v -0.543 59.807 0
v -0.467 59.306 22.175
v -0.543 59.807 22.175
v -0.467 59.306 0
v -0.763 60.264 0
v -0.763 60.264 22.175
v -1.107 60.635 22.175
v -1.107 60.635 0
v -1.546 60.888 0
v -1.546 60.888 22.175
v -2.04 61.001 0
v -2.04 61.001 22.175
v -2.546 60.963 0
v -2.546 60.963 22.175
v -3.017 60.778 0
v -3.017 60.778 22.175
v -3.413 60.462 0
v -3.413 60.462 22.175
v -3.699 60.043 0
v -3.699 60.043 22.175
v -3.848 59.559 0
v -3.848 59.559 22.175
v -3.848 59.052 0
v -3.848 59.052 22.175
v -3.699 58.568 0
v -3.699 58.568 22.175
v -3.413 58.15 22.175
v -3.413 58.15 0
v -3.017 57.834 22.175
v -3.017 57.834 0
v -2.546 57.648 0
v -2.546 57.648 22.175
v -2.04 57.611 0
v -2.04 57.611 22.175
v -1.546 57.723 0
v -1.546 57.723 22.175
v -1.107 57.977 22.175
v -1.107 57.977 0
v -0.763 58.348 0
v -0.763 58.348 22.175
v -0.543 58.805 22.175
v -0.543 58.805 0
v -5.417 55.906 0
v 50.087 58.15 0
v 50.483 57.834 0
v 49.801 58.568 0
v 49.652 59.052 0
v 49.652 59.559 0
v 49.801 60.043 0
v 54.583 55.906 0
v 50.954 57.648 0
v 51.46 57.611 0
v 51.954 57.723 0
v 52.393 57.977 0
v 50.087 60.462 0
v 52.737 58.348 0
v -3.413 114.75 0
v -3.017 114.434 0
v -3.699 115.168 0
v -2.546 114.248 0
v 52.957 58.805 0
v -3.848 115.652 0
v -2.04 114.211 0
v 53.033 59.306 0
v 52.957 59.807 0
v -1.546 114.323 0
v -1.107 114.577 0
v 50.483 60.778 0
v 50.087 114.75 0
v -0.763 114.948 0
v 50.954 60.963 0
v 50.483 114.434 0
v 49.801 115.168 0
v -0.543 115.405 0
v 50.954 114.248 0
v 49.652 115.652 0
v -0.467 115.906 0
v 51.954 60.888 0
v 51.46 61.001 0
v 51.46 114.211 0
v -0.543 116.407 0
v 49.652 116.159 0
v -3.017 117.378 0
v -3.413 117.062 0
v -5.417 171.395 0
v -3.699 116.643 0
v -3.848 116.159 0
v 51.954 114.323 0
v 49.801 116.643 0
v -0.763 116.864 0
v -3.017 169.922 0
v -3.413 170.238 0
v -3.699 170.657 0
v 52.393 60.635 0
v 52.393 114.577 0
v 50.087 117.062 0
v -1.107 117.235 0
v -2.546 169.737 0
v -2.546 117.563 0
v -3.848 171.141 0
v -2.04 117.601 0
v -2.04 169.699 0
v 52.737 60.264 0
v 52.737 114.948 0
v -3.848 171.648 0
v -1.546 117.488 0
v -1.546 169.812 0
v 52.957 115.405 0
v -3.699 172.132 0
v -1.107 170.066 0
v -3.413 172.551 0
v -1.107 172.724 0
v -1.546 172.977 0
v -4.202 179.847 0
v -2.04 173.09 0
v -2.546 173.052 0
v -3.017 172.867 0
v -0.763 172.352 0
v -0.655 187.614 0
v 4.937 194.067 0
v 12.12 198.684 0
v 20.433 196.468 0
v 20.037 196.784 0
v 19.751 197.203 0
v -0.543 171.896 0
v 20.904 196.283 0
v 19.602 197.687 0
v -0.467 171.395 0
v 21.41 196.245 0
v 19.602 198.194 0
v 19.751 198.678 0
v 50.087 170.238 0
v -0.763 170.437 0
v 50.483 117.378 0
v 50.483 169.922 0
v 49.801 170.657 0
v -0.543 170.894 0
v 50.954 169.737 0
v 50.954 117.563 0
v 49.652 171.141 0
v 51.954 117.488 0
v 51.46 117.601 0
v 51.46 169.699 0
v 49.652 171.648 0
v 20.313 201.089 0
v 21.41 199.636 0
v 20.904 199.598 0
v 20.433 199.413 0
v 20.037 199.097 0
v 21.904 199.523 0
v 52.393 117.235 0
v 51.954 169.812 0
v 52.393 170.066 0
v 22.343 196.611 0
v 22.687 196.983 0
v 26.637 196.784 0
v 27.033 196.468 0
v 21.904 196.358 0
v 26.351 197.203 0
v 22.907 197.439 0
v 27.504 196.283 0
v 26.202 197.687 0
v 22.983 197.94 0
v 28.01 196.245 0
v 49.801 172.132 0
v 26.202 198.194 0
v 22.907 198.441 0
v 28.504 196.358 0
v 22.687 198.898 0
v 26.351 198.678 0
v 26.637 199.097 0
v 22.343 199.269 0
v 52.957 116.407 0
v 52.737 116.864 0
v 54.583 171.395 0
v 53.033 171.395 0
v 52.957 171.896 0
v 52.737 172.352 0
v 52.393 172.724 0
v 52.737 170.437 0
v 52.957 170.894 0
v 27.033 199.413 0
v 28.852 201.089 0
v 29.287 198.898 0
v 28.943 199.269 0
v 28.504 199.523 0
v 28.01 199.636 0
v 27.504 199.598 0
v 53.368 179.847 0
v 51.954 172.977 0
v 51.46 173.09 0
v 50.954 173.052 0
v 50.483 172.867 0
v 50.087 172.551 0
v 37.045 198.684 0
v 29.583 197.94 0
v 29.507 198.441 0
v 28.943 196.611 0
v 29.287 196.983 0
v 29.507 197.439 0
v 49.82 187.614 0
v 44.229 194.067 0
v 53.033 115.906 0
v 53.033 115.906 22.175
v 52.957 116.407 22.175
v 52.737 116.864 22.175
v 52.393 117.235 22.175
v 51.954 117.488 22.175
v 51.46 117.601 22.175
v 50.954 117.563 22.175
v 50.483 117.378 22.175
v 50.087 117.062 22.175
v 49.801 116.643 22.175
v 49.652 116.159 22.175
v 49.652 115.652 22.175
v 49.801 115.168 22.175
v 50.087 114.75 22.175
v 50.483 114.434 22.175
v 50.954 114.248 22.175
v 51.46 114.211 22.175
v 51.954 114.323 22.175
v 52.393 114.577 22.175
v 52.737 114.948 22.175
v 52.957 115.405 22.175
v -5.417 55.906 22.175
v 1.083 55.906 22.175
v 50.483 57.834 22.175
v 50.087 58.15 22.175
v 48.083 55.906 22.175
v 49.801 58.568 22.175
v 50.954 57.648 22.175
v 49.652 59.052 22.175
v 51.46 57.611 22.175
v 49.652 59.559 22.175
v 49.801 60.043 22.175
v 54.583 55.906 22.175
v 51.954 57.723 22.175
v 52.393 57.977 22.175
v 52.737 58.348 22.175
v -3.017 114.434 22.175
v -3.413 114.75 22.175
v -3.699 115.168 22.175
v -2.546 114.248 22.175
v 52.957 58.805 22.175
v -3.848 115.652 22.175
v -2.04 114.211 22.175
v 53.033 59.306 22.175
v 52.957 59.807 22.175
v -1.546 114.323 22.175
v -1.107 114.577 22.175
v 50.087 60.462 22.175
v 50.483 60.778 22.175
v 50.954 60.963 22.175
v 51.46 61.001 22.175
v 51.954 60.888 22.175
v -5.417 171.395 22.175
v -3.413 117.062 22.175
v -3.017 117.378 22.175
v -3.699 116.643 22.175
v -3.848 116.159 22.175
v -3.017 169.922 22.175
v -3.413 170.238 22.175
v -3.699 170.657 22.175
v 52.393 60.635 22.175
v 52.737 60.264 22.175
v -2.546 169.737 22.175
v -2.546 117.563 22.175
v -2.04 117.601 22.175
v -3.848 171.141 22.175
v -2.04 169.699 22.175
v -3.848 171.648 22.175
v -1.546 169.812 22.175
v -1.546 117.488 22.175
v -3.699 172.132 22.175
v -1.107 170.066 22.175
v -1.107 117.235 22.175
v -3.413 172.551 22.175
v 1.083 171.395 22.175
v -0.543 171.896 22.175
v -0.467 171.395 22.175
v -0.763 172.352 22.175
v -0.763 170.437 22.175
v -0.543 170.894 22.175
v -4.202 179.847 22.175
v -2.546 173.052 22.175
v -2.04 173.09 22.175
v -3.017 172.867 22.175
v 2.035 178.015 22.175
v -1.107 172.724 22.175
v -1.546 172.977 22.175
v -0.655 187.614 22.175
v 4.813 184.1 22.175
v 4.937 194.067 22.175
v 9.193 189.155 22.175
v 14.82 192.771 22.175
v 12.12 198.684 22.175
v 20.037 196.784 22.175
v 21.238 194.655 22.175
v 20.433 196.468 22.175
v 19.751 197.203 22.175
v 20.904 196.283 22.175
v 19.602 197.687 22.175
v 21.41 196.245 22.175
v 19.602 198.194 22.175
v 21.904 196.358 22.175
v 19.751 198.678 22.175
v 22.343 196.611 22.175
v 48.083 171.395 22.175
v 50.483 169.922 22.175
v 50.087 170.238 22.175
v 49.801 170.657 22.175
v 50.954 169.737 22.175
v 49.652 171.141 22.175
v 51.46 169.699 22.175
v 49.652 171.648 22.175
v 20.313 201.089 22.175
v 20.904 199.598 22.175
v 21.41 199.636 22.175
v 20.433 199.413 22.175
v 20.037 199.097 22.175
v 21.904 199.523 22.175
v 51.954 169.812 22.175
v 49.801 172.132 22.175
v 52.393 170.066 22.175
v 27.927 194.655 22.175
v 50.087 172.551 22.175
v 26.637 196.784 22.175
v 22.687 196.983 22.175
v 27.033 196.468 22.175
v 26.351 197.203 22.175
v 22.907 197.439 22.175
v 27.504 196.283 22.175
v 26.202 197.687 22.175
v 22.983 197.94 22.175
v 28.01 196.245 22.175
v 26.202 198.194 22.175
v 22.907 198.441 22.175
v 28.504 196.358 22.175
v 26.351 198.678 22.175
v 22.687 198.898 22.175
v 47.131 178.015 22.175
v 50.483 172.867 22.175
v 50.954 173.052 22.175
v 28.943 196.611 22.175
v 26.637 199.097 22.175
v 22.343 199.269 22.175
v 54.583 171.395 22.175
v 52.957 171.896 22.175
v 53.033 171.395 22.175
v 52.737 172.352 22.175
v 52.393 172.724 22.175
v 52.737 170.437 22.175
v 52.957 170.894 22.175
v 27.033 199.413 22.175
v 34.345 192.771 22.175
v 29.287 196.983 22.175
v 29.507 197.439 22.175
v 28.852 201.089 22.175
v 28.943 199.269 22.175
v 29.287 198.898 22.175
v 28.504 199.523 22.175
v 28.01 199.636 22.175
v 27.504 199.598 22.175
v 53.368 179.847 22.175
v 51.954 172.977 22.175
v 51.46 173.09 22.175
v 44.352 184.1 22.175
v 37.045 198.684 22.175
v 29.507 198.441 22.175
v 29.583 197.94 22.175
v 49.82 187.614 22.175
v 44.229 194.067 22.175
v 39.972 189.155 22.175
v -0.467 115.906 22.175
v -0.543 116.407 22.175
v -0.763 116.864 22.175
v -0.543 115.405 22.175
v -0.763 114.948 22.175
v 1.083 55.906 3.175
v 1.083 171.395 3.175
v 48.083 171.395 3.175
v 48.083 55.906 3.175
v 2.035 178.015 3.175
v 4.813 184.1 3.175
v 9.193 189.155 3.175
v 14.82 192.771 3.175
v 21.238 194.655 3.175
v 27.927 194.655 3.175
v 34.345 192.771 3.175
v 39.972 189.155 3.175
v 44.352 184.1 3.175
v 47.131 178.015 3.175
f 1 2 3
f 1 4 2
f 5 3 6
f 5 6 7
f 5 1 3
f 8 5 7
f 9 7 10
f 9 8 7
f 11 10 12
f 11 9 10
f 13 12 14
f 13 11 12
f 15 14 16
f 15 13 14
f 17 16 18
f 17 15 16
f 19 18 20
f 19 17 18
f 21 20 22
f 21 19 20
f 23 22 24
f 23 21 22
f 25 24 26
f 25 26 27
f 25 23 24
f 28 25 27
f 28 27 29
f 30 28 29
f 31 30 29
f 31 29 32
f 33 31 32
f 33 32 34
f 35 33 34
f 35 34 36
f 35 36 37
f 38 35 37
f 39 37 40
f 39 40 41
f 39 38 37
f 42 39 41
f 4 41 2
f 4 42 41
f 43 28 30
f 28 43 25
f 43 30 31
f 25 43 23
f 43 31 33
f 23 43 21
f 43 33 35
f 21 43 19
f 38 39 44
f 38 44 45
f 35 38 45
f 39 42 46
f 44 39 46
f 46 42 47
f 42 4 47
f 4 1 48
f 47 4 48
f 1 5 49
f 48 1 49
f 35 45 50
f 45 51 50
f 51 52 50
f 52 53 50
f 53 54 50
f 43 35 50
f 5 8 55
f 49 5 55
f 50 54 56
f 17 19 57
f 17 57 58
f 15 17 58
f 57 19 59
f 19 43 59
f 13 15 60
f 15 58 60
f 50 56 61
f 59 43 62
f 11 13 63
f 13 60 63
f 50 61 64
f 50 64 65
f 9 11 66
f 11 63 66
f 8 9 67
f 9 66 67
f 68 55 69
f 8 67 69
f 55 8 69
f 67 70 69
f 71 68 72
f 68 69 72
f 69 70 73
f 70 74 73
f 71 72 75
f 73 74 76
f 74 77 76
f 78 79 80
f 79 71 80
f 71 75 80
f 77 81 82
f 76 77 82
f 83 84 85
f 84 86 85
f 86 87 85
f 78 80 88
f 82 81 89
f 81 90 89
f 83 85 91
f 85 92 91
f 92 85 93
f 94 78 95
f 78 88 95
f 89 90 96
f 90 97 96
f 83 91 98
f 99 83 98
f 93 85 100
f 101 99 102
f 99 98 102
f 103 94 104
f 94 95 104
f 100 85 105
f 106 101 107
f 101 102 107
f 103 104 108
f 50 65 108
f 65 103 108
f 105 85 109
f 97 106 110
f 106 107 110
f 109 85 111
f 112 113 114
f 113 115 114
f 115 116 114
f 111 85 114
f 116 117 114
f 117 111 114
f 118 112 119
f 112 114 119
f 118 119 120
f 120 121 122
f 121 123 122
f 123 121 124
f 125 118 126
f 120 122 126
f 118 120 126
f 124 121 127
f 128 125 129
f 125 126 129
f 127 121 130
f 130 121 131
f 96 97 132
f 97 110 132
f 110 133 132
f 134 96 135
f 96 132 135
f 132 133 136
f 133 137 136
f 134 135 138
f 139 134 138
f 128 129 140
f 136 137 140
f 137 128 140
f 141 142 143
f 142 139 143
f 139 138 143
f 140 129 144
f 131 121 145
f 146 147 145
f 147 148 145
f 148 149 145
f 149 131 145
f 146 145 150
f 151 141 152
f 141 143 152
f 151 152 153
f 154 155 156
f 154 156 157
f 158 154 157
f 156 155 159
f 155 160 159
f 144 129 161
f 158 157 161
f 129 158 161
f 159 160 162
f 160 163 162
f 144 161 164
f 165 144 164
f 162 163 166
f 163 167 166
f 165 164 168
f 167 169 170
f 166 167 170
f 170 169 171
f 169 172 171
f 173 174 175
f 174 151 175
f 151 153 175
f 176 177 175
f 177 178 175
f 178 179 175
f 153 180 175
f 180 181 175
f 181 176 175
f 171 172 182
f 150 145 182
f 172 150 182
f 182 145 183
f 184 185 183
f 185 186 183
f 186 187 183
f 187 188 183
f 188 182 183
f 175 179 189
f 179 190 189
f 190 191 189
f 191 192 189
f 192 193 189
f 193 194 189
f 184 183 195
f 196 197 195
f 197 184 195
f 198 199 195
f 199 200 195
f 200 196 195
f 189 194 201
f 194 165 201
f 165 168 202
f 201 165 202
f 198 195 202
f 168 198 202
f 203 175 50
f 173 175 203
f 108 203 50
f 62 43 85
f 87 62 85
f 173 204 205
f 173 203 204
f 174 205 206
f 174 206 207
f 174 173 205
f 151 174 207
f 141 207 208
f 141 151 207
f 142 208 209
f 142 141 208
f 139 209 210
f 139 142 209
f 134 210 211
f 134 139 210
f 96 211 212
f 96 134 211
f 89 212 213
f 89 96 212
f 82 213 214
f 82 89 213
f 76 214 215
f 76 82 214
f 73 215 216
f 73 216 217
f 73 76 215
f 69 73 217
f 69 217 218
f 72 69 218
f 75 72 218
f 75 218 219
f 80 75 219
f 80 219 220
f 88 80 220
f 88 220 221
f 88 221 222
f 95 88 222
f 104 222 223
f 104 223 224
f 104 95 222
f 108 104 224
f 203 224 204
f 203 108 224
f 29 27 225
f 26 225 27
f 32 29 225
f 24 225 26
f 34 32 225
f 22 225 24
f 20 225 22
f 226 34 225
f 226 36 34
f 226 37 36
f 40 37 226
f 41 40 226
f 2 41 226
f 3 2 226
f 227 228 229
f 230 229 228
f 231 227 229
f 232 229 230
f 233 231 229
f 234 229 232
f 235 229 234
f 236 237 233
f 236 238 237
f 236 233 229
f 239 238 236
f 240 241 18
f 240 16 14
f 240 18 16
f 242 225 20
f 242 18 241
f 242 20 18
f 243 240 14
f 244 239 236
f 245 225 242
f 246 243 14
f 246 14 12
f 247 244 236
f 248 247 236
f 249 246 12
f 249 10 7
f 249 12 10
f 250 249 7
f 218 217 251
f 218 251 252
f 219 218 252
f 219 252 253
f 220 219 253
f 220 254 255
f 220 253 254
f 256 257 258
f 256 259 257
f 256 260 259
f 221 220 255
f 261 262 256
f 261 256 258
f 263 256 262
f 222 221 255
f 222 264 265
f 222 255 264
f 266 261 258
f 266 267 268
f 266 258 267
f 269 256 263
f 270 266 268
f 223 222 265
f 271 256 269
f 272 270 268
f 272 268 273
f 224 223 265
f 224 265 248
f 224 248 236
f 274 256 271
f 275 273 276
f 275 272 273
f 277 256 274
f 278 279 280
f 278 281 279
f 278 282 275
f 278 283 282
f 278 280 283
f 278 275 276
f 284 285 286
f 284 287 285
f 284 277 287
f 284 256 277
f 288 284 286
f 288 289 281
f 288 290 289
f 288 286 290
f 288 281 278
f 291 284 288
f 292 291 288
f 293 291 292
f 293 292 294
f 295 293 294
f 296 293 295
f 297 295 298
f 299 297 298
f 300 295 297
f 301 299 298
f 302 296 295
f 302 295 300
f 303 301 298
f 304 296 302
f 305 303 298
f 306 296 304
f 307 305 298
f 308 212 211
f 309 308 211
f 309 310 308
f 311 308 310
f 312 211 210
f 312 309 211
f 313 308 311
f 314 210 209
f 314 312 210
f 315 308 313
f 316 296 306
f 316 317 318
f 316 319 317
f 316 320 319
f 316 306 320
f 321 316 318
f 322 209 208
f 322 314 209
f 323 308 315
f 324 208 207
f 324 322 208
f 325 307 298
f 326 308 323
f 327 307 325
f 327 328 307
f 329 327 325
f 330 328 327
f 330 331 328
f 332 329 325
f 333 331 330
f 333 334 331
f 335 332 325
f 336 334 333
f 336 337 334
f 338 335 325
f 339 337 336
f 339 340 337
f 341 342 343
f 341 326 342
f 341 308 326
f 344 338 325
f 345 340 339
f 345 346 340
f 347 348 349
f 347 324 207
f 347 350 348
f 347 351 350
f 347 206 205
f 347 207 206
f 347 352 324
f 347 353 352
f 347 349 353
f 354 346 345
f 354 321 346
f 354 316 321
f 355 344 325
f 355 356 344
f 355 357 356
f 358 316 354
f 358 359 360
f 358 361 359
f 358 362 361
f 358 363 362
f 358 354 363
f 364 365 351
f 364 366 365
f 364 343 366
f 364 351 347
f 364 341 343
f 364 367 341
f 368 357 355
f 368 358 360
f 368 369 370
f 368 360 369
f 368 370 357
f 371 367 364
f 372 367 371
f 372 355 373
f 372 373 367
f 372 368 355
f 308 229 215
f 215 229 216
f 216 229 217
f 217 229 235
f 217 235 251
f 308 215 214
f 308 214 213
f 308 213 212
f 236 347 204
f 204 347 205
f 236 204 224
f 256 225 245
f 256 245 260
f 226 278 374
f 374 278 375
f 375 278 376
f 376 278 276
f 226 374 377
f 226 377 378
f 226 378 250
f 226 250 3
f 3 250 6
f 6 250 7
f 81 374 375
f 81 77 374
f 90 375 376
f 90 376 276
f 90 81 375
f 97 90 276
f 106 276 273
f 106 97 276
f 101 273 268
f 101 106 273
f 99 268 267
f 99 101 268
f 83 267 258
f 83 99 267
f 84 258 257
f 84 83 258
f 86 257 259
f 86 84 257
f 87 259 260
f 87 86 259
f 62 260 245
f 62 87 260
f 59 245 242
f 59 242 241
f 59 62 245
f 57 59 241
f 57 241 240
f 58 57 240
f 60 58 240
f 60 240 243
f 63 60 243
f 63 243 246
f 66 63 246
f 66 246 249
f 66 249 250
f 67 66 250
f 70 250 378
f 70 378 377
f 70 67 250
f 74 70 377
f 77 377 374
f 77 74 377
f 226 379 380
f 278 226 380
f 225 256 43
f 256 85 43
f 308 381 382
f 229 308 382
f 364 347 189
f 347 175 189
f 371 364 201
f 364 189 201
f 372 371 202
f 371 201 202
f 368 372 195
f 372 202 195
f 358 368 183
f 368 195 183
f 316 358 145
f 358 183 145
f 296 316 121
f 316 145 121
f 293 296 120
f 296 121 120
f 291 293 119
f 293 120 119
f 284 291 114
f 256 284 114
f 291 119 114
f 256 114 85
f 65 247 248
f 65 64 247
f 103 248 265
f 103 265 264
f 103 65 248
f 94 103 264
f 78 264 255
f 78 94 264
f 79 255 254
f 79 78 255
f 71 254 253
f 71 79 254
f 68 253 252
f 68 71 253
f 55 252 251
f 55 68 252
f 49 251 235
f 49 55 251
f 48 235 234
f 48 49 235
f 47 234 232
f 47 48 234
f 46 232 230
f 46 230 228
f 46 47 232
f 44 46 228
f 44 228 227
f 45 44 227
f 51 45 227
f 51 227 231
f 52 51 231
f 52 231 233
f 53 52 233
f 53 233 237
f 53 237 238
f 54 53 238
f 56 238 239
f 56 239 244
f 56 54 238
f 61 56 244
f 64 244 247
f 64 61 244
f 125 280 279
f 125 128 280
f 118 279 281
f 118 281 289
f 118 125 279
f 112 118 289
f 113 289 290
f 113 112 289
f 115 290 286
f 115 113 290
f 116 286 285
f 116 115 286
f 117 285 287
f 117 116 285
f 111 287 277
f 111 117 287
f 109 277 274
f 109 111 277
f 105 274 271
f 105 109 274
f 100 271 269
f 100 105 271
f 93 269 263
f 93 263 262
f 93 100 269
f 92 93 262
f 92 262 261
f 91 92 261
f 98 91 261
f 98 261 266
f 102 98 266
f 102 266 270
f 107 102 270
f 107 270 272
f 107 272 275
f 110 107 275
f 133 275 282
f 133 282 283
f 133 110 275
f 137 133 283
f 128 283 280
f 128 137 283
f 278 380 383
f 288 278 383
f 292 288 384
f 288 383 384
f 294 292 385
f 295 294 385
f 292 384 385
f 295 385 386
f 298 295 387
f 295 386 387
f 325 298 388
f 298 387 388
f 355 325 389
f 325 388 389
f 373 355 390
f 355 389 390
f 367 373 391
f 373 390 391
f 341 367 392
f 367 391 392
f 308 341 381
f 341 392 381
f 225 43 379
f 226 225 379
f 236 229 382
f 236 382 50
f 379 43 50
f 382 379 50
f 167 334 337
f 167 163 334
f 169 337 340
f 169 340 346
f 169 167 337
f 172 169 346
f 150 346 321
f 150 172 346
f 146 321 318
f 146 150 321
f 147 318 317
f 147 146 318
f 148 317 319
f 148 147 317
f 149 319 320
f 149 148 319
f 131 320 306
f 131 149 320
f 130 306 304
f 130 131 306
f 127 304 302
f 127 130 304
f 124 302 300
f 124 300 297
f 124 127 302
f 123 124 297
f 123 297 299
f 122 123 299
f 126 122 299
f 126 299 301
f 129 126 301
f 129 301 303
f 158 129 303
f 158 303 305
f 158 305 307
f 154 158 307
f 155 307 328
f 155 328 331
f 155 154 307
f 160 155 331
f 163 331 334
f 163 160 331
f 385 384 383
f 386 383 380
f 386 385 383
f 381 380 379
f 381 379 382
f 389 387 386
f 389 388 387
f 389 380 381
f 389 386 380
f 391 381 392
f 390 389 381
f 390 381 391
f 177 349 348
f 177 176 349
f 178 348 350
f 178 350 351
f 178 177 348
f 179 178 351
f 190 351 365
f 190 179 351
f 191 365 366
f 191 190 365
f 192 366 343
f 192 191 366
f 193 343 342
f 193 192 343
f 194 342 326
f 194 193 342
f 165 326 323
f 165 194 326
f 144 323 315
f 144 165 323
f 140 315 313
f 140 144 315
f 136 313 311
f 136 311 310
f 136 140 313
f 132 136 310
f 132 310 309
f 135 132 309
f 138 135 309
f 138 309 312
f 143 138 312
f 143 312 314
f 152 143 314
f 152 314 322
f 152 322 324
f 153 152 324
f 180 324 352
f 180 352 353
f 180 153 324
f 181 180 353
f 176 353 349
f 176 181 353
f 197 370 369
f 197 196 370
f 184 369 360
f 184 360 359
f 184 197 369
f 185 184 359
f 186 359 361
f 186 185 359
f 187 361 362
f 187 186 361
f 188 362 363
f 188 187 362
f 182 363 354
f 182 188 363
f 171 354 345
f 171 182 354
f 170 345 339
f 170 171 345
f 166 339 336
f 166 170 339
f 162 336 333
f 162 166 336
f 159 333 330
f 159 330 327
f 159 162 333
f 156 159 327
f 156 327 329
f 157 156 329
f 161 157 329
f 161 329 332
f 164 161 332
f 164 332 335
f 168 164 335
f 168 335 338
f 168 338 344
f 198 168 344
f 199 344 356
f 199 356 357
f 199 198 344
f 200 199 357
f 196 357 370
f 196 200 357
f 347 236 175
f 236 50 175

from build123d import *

# Parameters (mm, degrees)
SKETCH2_R           = 1.7
BOSS_EXTRUDE1_DEPTH = 3.175
SKETCH3_W           = 60
SKETCH3_H           = 160.555920096
CUT_EXTRUDE1_DEPTH  = 4.175
SKETCH4_R           = 1.7
BOSS_EXTRUDE2_DEPTH = 19


with BuildPart() as part:
    # Sketch2 → Boss-Extrude1 (new body)
    with BuildSketch(Plane.XY):
        with BuildLine():
            Line((54.582717937, -59.58290593), (54.582717937, 171.394622999))
            ThreePointArc((54.582717937, 171.394622999), (24.582717937, 201.394622999), (-5.417282063, 171.394622999))
            Line((-5.417282063, 171.394622999), (-5.417282063, -59.58290593))
            ThreePointArc((-5.417282063, -59.58290593), (24.582717937, -89.58290593), (54.582717937, -59.58290593))
        make_face()
        with Locations((27.882717937, 197.940291196)):
            Circle(SKETCH2_R, mode=Mode.SUBTRACT)
        with Locations((-2.167282063, -59.58290593)):
            Circle(SKETCH2_R, mode=Mode.SUBTRACT)
        with Locations((5.667611541, -78.498012327)):
            Circle(SKETCH2_R, mode=Mode.SUBTRACT)
        with Locations((21.182717937, -86.115951364)):
            Circle(SKETCH2_R, mode=Mode.SUBTRACT)
        with Locations((51.332717937, 171.394622999)):
            Circle(SKETCH2_R, mode=Mode.SUBTRACT)
        with Locations((-2.167282063, 59.305858535)):
            Circle(SKETCH2_R, mode=Mode.SUBTRACT)
        with Locations((27.982717937, -86.115951364)):
            Circle(SKETCH2_R, mode=Mode.SUBTRACT)
        with Locations((-2.167282063, 171.394622999)):
            Circle(SKETCH2_R, mode=Mode.SUBTRACT)
        with Locations((51.332717937, 115.905858535)):
            Circle(SKETCH2_R, mode=Mode.SUBTRACT)
        with Locations((-2.167282063, 115.905858535)):
            Circle(SKETCH2_R, mode=Mode.SUBTRACT)
        with Locations((43.497824334, -78.498012327)):
            Circle(SKETCH2_R, mode=Mode.SUBTRACT)
        with Locations((51.332717937, -59.58290593)):
            Circle(SKETCH2_R, mode=Mode.SUBTRACT)
        with Locations((51.332717937, -34.094141465)):
            Circle(SKETCH2_R, mode=Mode.SUBTRACT)
        with Locations((-2.167282063, -34.094141465)):
            Circle(SKETCH2_R, mode=Mode.SUBTRACT)
        with Locations((51.332717937, -4.094141465)):
            Circle(SKETCH2_R, mode=Mode.SUBTRACT)
        with Locations((-2.167282063, -4.094141465)):
            Circle(SKETCH2_R, mode=Mode.SUBTRACT)
        with Locations((51.332717937, 25.905858535)):
            Circle(SKETCH2_R, mode=Mode.SUBTRACT)
        with Locations((-2.167282063, 25.905858535)):
            Circle(SKETCH2_R, mode=Mode.SUBTRACT)
        with Locations((21.282717937, 197.940291196)):
            Circle(SKETCH2_R, mode=Mode.SUBTRACT)
        with Locations((51.332717937, 52.505858535)):
            Circle(SKETCH2_R, mode=Mode.SUBTRACT)
        with Locations((51.332717937, 59.305858535)):
            Circle(SKETCH2_R, mode=Mode.SUBTRACT)
        with Locations((-2.167282063, 52.505858535)):
            Circle(SKETCH2_R, mode=Mode.SUBTRACT)
    extrude(amount=BOSS_EXTRUDE1_DEPTH)

    # Sketch3 → Cut-Extrude1 (cut, through all)
    with BuildSketch(Plane.XY.offset(3.175)):
        with Locations((24.582717937, -24.372101513)):
            Rectangle(SKETCH3_W, SKETCH3_H)
    extrude(amount=-CUT_EXTRUDE1_DEPTH, mode=Mode.SUBTRACT)

    # Sketch4 → Boss-Extrude2 (add)
    with BuildSketch(Plane.XY.offset(3.175)):
        with BuildLine():
            Line((48.082717937, 171.394622999), (48.082717937, 55.905858535))
            Line((48.082717937, 55.905858535), (54.582717937, 55.905858535))
            Line((54.582717937, 55.905858535), (54.582717937, 171.394622999))
            ThreePointArc((54.582717937, 171.394622999), (24.582717937, 201.394622999), (-5.417282063, 171.394622999))
            Line((-5.417282063, 171.394622999), (-5.417282063, 55.905858535))
            Line((-5.417282063, 55.905858535), (1.082717937, 55.905858535))
            Line((1.082717937, 55.905858535), (1.082717937, 171.394622999))
            ThreePointArc((1.082717937, 171.394622999), (24.582717937, 194.894622999), (48.082717937, 171.394622999))
        make_face()
        with Locations((-2.167282063, 115.905858535)):
            Circle(SKETCH4_R, mode=Mode.SUBTRACT)
        with Locations((-2.167282063, 59.305858535)):
            Circle(SKETCH4_R, mode=Mode.SUBTRACT)
        with Locations((51.332717937, 59.305858535)):
            Circle(SKETCH4_R, mode=Mode.SUBTRACT)
        with Locations((51.332717937, 115.905858535)):
            Circle(SKETCH4_R, mode=Mode.SUBTRACT)
        with Locations((51.332717937, 171.394622999)):
            Circle(SKETCH4_R, mode=Mode.SUBTRACT)
        with Locations((27.882717937, 197.940291196)):
            Circle(SKETCH4_R, mode=Mode.SUBTRACT)
        with Locations((21.282717937, 197.940291196)):
            Circle(SKETCH4_R, mode=Mode.SUBTRACT)
        with Locations((-2.167282063, 171.394622999)):
            Circle(SKETCH4_R, mode=Mode.SUBTRACT)
    extrude(amount=BOSS_EXTRUDE2_DEPTH)


solid = part.part
